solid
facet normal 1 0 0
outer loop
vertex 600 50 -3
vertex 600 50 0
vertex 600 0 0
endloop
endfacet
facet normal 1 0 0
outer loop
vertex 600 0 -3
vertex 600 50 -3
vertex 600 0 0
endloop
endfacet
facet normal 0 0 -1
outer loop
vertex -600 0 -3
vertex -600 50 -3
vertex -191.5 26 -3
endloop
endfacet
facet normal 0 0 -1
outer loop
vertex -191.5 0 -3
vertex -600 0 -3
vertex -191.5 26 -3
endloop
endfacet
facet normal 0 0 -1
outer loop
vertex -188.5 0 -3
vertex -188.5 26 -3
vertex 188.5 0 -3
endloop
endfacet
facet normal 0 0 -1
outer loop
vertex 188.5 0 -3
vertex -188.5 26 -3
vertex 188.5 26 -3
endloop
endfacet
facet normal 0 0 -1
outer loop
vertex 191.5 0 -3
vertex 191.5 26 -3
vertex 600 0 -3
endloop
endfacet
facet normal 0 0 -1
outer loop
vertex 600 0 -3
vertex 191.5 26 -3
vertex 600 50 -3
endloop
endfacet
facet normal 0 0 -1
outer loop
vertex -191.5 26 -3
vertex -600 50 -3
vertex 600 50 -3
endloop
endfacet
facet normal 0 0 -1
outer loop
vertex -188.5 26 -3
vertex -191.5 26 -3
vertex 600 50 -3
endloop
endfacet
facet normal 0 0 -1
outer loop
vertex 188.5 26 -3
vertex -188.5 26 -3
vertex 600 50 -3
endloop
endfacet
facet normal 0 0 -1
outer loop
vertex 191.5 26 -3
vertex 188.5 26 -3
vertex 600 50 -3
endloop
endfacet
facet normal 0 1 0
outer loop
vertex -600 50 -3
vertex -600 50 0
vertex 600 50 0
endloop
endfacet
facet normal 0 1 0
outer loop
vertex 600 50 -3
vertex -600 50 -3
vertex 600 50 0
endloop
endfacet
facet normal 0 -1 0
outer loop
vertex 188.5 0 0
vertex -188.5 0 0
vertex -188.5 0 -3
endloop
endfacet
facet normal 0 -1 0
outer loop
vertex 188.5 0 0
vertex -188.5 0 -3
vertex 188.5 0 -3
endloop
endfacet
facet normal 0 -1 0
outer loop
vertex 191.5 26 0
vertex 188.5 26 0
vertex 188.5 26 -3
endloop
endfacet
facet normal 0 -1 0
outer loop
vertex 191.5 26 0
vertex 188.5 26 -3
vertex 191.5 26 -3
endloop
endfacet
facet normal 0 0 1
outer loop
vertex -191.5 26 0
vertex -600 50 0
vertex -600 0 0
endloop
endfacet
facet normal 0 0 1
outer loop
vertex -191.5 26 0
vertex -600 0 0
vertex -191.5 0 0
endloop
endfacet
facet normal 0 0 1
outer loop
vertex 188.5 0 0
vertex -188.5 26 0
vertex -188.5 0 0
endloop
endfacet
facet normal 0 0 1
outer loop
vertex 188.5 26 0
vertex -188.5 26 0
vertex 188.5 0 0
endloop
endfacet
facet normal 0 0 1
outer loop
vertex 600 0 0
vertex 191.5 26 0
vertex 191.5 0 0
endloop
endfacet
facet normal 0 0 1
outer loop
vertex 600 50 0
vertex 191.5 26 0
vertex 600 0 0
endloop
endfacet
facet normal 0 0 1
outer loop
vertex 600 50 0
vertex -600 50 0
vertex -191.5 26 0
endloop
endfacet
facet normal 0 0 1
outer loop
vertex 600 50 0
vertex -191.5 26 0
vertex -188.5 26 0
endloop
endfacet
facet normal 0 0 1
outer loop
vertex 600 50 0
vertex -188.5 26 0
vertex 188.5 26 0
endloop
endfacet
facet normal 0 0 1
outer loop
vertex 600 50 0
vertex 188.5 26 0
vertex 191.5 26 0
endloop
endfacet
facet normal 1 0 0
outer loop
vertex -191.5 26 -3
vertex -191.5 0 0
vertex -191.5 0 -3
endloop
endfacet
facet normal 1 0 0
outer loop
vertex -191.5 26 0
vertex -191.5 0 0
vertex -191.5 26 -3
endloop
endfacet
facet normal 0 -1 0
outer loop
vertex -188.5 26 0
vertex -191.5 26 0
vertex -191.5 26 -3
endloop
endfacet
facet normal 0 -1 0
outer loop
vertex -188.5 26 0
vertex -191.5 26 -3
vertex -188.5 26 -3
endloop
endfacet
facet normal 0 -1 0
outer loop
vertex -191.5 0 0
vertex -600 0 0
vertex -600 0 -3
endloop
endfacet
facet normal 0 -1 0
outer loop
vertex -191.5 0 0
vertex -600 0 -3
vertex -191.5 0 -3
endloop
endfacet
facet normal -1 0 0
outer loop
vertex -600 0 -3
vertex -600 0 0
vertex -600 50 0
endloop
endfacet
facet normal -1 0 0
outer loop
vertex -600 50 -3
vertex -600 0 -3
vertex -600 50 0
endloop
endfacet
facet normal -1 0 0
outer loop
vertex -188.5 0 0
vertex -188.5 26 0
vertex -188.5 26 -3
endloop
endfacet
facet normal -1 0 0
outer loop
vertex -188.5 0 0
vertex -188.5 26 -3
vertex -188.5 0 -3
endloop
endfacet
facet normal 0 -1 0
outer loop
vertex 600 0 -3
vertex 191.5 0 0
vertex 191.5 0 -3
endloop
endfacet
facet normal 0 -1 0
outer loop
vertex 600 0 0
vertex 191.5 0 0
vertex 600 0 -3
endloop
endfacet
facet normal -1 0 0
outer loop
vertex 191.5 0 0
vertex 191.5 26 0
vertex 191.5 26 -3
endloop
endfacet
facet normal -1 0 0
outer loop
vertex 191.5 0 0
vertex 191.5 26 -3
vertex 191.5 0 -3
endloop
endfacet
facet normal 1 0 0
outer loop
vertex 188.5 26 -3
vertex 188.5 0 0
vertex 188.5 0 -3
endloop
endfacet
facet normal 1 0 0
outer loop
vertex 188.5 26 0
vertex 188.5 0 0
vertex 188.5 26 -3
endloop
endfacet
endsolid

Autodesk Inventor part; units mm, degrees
ref_plane "YZ Plane" through (0, 0, 0) normal (1, 0, 0) x (0, 1, 0)
ref_plane "XZ Plane" through (0, 0, 0) normal (0, 1, 0) x (-1, 0, 0)
ref_plane "XY Plane" through (0, 0, 0) normal (0, 0, 1) x (1, 0, 0)
sketch "Sketch1" plane through (0, 0, 0) normal (0, 0, 1) x (1, 0, 0)
  line L0 (-600, 0) -> (600, 0)
  line L1 (-600, 0) -> (-600, 50)
  line L2 (-600, 50) -> (600, 50)
  line L3 (600, 50) -> (600, 0)
  circle A0 centre (-600, 0) radius 25
  circle A1 centre (600, 0) radius 25
  line L4 (600, 0) -> (644.2345, 16.1001)
  line L5 (644.2345, 16.1001) -> (635, 50)
  line L6 (635, 50) -> (600, 50)
  point P0 (0, 0)
  point P1 (0, 0)
  point P2 (-600, 25)
  point P3 (-575, 0)
  point P4 (575, 0)
  point P5 (600, 25)
  point P6 (623.4923, 8.5505)
  dimension "d18" = 50
  dimension "d19" = 1200
  dimension "d25" = 50
  dimension "d26" = 50
  dimension "d39" = 70
  dimension "d40" = 35
extrude "Plate2" add sketch "Sketch1" against normal blind 3 contours L1 A0 L0 | A0 L1 L2 L3 A1 L0 | A1 L3 L0 picked at (-598.1457, 16.4577)
sketch "Sketch3" plane through (0, 0, 0) normal (0, 0, 1) x (1, 0, 0)
  line L0 (-190, 0) -> (-190, 50) construction
  line L1 (600, 50) -> (-600, 50) projected
  line L2 (-600, 50) -> (-600, 0) projected
  line L3 (-191.5, 26) -> (-188.5, 26)
  line L4 (-188.5, 26) -> (-188.5, 0)
  line L5 (-188.5, 0) -> (-191.5, 0)
  line L6 (-191.5, 0) -> (-191.5, 26)
  line L7 (-600, 0) -> (600, 0) projected
  line L8 (190, 50) -> (190, 0) construction
  line L9 (188.5, 26) -> (191.5, 26)
  line L10 (191.5, 26) -> (191.5, 0)
  line L11 (191.5, 0) -> (188.5, 0)
  line L12 (188.5, 0) -> (188.5, 26)
  point P0 (0, 0)
  point P1 (-550, 25)
  point P2 (-525, 0)
  point P3 (525, 0)
  point P4 (0, 0)
  point P5 (0, 0)
  point P6 (191.5, 0)
  point P7 (585, 50)
  dimension "d28" = 3
  dimension "d29" = 26
  dimension "d35" = 190
  dimension "d36" = 190
  dimension "d37" = 3
  dimension "d38" = 26
extrude "Extrusion2" cut sketch "Sketch3" against normal through all
equation "\"d28\" = Thickness"
equation "\"d36\" = d35"
equation "\"d37\" = Thickness"
equation "\"d38\" = d29"
equation "\"d20\" = Thickness"
equation "\"BendReliefWidth\" = Thickness"
equation "\"BendReliefDepth\" = 0.5 * Thickness"
equation "\"CornerReliefSize\" = 4 * Thickness"
equation "\"MinimumRemnant\" = 2 * Thickness"
equation "\"TransitionRadius\" = BendRadius"
equation "\"JacobiRadiusSize\" = BendRadius"
equation "\"GapSize\" = Thickness"
equation "\"Thickness\" = 3"
equation "\"BendRadius\" = 5"
properties part number "MSC 106 rib cone" material "Stainless Steel"
